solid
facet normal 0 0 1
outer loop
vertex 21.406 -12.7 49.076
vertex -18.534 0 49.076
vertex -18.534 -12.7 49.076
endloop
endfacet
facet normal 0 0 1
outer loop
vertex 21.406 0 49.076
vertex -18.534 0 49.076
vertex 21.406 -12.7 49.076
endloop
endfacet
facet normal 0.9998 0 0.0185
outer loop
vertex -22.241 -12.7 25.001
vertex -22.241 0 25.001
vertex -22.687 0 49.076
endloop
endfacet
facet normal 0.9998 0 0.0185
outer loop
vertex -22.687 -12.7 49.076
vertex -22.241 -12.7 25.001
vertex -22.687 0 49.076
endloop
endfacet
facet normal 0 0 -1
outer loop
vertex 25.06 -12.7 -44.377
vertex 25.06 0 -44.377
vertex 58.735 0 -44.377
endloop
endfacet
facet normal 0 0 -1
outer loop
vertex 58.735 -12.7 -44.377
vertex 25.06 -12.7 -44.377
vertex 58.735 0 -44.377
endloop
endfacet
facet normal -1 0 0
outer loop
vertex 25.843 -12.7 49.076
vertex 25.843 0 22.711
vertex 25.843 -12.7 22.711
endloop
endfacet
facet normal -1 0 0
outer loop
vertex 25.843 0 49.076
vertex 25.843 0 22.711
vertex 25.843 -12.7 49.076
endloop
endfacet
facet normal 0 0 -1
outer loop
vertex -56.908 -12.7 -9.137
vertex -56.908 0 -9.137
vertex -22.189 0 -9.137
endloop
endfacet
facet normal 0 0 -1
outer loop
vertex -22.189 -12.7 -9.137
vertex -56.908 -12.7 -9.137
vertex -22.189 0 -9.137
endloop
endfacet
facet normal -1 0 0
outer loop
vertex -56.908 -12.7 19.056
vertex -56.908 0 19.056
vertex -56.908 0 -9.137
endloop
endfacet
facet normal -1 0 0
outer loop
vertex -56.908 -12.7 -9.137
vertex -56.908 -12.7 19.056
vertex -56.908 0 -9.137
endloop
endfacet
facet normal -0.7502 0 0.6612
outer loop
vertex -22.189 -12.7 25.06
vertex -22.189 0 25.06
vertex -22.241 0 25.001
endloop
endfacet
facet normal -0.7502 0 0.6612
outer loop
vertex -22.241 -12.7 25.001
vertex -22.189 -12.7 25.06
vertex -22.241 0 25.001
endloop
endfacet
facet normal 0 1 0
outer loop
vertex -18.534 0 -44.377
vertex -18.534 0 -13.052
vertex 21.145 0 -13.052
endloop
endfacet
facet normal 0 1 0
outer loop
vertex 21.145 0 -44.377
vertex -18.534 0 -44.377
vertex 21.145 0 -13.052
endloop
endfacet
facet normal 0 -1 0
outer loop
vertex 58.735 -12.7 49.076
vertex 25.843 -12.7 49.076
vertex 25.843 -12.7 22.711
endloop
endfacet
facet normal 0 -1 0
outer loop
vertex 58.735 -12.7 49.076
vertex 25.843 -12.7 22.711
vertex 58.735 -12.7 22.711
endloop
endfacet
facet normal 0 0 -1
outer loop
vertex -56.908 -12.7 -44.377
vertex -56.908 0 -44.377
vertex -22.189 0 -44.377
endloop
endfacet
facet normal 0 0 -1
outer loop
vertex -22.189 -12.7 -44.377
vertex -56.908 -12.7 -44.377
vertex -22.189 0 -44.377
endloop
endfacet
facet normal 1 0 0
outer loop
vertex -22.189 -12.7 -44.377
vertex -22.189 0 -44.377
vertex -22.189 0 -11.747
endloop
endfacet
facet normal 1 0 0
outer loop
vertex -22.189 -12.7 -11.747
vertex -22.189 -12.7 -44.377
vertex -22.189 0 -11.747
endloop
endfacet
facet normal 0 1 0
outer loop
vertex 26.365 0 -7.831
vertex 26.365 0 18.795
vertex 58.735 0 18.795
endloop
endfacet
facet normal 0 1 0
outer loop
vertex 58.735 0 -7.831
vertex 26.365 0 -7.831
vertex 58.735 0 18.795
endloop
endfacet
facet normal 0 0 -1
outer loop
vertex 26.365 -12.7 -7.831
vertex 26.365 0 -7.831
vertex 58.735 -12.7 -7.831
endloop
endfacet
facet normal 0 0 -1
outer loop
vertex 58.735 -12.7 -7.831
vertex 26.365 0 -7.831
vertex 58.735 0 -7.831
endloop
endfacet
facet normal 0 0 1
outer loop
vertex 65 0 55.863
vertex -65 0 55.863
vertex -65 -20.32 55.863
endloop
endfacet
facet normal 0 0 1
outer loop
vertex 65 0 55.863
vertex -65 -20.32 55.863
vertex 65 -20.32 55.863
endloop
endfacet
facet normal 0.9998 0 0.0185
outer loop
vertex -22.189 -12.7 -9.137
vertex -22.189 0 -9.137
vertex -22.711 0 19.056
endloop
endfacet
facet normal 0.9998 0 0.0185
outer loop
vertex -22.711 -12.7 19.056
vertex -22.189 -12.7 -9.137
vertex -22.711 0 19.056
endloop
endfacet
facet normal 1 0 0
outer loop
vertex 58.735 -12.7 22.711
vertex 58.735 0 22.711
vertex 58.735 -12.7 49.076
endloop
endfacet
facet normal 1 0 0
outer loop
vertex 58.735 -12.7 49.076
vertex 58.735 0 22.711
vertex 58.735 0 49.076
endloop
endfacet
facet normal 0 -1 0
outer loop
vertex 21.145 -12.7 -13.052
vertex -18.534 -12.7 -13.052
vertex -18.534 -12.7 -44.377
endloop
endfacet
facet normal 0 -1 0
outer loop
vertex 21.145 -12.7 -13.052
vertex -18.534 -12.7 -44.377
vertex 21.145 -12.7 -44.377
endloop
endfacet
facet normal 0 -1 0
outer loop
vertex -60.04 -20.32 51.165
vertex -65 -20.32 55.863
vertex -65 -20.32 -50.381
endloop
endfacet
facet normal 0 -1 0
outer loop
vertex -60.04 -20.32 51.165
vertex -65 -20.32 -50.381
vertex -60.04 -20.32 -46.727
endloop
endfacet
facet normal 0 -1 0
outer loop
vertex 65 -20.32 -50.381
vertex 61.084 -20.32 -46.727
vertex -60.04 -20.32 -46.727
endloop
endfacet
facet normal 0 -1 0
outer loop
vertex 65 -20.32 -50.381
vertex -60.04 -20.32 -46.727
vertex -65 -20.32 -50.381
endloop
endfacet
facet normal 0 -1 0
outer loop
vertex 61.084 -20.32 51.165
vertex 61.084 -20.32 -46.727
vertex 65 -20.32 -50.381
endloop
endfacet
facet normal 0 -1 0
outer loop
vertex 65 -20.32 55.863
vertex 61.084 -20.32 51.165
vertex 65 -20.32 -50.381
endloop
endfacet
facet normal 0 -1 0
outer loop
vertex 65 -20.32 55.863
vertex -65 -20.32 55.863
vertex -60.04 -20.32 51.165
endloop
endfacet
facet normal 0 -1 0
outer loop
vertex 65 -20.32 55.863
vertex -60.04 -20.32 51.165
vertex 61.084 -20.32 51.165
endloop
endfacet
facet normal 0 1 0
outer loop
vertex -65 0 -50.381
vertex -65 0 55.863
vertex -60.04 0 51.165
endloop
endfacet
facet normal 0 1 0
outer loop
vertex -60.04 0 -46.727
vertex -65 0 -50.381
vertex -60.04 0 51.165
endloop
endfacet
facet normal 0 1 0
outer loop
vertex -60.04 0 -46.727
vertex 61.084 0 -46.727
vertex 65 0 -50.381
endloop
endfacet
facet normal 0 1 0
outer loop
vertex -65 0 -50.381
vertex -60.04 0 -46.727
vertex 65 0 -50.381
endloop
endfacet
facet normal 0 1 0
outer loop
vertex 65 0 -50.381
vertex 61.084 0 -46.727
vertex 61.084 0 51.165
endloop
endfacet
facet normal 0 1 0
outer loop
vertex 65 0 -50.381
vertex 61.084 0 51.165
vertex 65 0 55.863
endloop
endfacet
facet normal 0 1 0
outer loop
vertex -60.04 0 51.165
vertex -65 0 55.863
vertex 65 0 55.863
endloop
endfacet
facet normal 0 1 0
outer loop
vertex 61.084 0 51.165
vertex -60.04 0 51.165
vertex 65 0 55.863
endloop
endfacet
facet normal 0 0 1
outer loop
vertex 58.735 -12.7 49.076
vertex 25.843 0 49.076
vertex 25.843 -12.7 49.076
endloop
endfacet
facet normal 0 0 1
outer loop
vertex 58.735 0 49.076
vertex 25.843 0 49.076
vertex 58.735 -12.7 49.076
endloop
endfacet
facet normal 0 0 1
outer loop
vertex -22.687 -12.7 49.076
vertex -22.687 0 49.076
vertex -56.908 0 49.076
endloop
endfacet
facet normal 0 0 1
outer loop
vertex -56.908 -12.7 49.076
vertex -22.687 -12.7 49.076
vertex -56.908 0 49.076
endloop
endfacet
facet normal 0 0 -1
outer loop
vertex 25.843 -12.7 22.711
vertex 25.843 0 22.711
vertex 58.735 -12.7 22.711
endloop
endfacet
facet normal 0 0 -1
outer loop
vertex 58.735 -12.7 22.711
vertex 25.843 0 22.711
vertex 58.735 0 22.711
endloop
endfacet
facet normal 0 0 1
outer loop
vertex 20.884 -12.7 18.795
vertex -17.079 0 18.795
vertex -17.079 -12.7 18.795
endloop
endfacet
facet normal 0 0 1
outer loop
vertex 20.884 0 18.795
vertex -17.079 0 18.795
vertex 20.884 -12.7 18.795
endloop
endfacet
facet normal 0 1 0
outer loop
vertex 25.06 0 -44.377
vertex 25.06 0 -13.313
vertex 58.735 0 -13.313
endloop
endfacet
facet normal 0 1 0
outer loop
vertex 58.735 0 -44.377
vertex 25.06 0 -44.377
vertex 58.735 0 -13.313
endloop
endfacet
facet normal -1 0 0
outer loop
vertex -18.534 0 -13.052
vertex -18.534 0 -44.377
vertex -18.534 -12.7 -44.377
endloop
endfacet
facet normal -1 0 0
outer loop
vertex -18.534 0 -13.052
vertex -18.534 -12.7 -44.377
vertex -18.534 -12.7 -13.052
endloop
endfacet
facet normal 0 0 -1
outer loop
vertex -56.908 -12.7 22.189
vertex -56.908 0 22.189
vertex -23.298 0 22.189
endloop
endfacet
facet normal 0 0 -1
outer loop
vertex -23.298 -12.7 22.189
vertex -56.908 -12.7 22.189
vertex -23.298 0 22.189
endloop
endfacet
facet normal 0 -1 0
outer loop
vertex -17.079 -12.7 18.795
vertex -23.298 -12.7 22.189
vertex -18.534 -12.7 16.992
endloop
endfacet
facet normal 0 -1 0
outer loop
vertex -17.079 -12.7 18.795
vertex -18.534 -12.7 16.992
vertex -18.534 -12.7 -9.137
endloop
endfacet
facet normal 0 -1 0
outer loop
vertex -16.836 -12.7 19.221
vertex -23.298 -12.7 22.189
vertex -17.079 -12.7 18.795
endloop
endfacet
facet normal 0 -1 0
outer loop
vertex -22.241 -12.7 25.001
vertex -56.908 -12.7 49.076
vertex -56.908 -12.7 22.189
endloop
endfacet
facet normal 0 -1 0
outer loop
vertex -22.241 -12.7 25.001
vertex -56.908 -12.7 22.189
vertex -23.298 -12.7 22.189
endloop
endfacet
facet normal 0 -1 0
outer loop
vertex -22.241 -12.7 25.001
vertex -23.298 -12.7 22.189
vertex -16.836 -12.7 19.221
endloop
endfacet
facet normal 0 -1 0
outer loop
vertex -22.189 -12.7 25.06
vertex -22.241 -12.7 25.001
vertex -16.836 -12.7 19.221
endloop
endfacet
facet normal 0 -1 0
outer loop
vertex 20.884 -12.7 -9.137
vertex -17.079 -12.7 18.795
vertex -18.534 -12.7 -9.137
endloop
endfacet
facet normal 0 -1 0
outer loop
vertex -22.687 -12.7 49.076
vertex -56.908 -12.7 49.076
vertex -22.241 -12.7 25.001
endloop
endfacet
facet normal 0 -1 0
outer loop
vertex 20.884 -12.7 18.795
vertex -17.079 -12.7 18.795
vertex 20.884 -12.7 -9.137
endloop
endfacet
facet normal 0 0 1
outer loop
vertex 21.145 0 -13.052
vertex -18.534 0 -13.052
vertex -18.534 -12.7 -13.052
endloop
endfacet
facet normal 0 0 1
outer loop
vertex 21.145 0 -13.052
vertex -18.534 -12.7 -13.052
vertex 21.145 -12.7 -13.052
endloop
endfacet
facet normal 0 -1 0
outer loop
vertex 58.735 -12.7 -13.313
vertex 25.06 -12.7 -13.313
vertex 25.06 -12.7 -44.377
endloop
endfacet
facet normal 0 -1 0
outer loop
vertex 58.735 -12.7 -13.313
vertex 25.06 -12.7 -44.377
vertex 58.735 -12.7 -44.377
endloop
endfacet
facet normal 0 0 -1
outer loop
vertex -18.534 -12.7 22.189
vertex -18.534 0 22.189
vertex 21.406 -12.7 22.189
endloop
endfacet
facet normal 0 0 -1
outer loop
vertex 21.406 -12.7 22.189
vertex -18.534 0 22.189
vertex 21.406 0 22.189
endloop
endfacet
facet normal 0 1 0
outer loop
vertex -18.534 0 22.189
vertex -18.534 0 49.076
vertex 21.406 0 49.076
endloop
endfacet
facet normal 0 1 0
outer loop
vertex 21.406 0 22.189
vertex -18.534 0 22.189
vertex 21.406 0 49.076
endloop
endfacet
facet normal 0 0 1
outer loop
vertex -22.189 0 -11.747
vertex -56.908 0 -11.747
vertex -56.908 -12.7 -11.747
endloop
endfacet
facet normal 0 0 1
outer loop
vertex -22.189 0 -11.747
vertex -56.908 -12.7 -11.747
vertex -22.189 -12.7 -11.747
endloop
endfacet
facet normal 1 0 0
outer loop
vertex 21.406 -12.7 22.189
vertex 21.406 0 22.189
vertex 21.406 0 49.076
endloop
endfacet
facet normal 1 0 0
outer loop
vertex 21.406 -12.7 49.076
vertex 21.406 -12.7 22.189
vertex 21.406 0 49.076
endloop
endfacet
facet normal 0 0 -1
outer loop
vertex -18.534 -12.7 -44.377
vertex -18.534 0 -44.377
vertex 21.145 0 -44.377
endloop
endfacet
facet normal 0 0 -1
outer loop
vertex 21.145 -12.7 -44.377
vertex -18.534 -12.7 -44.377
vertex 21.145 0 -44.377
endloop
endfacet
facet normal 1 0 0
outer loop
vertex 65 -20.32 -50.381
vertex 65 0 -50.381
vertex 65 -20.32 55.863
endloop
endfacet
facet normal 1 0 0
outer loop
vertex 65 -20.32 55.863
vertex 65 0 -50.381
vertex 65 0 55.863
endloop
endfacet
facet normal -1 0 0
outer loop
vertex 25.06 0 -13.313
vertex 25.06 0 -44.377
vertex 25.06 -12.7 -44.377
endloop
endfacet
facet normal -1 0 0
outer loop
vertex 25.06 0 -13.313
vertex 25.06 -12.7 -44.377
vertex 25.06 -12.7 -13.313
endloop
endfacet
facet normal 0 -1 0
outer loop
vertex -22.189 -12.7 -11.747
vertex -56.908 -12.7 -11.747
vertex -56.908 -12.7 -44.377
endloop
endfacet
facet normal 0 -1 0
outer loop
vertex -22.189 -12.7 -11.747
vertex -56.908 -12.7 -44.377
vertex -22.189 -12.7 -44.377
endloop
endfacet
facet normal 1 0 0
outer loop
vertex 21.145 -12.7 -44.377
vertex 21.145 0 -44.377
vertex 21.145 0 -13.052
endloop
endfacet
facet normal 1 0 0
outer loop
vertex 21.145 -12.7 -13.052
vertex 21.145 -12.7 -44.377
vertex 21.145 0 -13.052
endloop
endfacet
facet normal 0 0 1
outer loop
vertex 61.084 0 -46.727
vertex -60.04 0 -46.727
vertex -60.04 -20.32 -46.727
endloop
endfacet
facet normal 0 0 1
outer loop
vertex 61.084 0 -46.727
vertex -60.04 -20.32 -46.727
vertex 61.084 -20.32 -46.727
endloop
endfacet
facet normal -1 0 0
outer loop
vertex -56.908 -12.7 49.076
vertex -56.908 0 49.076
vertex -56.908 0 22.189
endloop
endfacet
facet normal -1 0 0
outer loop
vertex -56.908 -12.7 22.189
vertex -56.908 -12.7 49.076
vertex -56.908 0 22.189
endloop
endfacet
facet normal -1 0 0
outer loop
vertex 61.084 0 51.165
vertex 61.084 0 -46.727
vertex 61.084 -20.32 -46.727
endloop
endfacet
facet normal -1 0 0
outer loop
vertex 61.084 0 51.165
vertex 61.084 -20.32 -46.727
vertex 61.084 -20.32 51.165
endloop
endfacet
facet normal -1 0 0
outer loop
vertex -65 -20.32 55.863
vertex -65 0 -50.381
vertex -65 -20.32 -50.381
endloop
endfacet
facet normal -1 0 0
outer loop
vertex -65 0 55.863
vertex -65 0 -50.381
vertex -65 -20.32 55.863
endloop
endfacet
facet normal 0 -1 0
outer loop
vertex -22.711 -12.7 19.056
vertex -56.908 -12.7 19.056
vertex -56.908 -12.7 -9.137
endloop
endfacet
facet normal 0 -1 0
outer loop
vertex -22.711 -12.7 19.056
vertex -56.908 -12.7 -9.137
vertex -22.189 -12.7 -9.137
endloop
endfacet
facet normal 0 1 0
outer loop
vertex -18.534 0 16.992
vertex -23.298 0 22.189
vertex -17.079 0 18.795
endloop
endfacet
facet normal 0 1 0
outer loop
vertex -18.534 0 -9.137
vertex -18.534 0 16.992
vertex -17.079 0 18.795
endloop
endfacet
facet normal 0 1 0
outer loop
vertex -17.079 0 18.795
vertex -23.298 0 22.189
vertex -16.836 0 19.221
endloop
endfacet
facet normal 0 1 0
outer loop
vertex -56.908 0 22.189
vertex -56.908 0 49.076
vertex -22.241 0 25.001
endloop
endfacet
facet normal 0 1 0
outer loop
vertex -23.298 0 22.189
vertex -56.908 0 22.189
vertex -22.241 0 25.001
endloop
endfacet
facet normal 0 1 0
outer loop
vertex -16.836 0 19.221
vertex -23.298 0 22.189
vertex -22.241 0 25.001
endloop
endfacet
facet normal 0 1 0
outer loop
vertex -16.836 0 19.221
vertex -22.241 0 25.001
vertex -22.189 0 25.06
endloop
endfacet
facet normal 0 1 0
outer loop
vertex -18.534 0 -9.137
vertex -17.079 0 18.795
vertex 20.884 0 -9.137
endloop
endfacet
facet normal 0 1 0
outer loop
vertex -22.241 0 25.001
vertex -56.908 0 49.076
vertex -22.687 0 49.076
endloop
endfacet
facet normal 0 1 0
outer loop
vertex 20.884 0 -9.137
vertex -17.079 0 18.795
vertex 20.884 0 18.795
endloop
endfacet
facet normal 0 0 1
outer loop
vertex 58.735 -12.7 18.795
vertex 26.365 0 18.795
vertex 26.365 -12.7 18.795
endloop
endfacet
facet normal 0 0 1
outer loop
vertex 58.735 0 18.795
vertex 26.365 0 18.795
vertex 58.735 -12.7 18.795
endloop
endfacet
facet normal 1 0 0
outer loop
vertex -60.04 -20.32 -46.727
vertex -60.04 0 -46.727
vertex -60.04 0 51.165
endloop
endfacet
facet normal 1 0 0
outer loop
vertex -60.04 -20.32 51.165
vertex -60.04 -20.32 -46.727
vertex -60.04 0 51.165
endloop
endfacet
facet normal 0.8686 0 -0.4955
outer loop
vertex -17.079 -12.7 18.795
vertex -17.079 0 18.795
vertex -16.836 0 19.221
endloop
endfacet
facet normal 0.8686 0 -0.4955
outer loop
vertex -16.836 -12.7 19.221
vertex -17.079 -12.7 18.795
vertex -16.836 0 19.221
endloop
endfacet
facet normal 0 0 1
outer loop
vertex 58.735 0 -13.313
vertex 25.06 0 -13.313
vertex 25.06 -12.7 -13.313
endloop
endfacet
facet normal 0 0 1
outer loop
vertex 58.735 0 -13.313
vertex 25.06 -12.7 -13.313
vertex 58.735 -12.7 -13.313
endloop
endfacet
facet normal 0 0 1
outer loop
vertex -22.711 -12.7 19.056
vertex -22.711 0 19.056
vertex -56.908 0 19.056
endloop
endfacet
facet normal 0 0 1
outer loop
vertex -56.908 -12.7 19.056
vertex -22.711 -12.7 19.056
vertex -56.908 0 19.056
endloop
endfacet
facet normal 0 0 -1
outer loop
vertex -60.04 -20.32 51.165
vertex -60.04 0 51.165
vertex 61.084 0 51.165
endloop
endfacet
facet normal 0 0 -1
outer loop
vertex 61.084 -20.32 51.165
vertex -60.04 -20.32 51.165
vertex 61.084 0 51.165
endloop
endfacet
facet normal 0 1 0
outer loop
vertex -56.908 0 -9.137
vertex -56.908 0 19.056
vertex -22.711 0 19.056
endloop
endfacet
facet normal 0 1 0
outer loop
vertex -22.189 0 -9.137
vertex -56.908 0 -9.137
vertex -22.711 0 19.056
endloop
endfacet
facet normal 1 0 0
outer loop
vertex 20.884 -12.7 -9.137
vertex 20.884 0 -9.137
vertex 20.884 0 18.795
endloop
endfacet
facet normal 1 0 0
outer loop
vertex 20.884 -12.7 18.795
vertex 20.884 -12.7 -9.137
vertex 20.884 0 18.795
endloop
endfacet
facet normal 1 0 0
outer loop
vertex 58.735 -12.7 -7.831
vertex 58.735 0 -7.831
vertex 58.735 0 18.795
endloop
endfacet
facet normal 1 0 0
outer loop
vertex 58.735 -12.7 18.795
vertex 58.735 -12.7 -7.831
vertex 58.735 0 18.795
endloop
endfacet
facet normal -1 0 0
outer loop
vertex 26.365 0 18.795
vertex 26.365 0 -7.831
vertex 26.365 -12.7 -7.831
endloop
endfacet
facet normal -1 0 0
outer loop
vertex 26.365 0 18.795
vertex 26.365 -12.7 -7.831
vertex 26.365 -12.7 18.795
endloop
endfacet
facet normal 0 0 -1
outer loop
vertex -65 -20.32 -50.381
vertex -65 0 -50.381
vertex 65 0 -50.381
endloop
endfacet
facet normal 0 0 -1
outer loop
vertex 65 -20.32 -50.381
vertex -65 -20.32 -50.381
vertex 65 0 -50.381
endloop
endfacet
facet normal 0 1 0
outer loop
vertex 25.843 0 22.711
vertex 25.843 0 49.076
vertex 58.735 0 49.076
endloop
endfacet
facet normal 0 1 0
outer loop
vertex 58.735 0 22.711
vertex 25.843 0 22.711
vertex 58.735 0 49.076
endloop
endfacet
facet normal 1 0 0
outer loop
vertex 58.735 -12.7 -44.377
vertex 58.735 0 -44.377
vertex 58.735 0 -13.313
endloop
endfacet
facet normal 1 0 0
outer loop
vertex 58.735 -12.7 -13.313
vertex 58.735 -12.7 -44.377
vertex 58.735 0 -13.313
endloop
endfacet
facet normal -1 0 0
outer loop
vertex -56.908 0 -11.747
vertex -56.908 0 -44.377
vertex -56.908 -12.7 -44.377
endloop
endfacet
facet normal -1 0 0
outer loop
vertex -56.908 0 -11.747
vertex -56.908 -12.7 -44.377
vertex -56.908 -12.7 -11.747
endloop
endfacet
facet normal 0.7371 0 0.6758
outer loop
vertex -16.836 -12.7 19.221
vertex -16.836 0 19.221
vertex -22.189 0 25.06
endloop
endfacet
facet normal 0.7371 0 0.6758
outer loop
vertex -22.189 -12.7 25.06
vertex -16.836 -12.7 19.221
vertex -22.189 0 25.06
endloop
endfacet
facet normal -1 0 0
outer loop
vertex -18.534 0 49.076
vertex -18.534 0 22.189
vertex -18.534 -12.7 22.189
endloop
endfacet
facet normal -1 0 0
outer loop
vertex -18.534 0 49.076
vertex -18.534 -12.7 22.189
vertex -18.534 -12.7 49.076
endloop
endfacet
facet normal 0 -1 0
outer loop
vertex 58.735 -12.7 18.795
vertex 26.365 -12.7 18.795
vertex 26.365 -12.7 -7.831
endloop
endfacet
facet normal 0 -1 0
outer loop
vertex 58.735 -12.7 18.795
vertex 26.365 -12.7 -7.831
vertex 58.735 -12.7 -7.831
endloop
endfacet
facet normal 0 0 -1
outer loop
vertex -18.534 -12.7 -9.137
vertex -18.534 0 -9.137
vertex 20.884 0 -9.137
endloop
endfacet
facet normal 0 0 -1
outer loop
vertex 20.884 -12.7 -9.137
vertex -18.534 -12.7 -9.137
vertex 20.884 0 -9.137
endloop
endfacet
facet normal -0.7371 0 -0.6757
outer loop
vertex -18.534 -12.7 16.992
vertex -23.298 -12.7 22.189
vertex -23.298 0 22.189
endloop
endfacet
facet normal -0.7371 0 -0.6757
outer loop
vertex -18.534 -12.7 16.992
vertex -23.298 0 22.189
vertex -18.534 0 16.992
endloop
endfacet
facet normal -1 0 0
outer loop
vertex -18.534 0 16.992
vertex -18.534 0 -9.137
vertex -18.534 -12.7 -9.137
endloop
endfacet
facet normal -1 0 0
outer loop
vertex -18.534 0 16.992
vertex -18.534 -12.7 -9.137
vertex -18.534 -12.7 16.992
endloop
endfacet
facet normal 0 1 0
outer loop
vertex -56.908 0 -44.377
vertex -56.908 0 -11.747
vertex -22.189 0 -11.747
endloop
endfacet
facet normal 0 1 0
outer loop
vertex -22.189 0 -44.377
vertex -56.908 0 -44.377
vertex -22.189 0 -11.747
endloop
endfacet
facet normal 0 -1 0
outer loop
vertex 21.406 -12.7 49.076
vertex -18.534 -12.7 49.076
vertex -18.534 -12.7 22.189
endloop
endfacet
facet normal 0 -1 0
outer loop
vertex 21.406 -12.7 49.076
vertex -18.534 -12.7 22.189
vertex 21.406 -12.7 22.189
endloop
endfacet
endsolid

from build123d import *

# Parameters (mm, degrees)
F0_W     = 39.939741
F0_H     = 26.887536
F0_W_2   = 32.891556
F0_H_2   = 26.365449
F0_W_3   = 39.417655
F0_H_3   = 27.931714
F0_W_4   = 32.369466
F0_H_4   = 26.626493
F0_W_5   = 34.718858
F0_H_5   = 32.630509
F0_W_6   = 39.678697
F0_H_6   = 31.325289
F0_W_7   = 33.674685
F0_H_7   = 31.064244
F1_DEPTH = 12.7
F2_W     = 129.999936
F2_H     = 106.244925
F2_W_2   = 121.124439
F2_H_2   = 97.891517
F3_DEPTH = 20.32
F5_DEPTH = 12.7


with BuildPart() as f1:
    # F0 (on Front) → F1 (new body)
    with BuildSketch(Plane.XZ):
        Polygon((-22.188744, 22.188745), (-22.686661, 49.076281), (-56.907602, 49.076281), (-56.907602, 22.188745), align=None)
        with Locations((1.435742, 35.632513)):
            Rectangle(F0_W, F0_H)
        with Locations((42.289138, 35.893556)):
            Rectangle(F0_W_2, F0_H_2)
        Polygon((-22.710832, 19.056216), (-56.907602, 19.056216), (-56.907602, -9.136542), (-22.188744, -9.136542), align=None)
        with Locations((1.174699, 4.829315)):
            Rectangle(F0_W_3, F0_H_3)
        with Locations((42.550183, 5.481926)):
            Rectangle(F0_W_4, F0_H_4)
        with Locations((-39.548173, -28.062236)):
            Rectangle(F0_W_5, F0_H_5)
        with Locations((1.305221, -28.714847)):
            Rectangle(F0_W_6, F0_H_6)
        with Locations((41.897574, -28.845369)):
            Rectangle(F0_W_7, F0_H_7)
    extrude(amount=F1_DEPTH)

    # F4 (on Front) → F5 (join)
    with BuildSketch(Plane.XZ):
        Polygon((-22.188744, 25.060229), (-24.016052, 22.971876), (-18.273082, 16.706819), (-16.835863, 19.220725), align=None)
    extrude(amount=F5_DEPTH)


with BuildPart() as f3:
    # F2 (on Front) → F3 (new body)
    with BuildSketch(Plane.XZ):
        with Locations((0, 2.740963)):
            Rectangle(F2_W, F2_H)
        with Locations((0.522089, 2.218877)):
            Rectangle(F2_W_2, F2_H_2, mode=Mode.SUBTRACT)
    extrude(amount=F3_DEPTH)


solid = Compound([f1.part, f3.part])
